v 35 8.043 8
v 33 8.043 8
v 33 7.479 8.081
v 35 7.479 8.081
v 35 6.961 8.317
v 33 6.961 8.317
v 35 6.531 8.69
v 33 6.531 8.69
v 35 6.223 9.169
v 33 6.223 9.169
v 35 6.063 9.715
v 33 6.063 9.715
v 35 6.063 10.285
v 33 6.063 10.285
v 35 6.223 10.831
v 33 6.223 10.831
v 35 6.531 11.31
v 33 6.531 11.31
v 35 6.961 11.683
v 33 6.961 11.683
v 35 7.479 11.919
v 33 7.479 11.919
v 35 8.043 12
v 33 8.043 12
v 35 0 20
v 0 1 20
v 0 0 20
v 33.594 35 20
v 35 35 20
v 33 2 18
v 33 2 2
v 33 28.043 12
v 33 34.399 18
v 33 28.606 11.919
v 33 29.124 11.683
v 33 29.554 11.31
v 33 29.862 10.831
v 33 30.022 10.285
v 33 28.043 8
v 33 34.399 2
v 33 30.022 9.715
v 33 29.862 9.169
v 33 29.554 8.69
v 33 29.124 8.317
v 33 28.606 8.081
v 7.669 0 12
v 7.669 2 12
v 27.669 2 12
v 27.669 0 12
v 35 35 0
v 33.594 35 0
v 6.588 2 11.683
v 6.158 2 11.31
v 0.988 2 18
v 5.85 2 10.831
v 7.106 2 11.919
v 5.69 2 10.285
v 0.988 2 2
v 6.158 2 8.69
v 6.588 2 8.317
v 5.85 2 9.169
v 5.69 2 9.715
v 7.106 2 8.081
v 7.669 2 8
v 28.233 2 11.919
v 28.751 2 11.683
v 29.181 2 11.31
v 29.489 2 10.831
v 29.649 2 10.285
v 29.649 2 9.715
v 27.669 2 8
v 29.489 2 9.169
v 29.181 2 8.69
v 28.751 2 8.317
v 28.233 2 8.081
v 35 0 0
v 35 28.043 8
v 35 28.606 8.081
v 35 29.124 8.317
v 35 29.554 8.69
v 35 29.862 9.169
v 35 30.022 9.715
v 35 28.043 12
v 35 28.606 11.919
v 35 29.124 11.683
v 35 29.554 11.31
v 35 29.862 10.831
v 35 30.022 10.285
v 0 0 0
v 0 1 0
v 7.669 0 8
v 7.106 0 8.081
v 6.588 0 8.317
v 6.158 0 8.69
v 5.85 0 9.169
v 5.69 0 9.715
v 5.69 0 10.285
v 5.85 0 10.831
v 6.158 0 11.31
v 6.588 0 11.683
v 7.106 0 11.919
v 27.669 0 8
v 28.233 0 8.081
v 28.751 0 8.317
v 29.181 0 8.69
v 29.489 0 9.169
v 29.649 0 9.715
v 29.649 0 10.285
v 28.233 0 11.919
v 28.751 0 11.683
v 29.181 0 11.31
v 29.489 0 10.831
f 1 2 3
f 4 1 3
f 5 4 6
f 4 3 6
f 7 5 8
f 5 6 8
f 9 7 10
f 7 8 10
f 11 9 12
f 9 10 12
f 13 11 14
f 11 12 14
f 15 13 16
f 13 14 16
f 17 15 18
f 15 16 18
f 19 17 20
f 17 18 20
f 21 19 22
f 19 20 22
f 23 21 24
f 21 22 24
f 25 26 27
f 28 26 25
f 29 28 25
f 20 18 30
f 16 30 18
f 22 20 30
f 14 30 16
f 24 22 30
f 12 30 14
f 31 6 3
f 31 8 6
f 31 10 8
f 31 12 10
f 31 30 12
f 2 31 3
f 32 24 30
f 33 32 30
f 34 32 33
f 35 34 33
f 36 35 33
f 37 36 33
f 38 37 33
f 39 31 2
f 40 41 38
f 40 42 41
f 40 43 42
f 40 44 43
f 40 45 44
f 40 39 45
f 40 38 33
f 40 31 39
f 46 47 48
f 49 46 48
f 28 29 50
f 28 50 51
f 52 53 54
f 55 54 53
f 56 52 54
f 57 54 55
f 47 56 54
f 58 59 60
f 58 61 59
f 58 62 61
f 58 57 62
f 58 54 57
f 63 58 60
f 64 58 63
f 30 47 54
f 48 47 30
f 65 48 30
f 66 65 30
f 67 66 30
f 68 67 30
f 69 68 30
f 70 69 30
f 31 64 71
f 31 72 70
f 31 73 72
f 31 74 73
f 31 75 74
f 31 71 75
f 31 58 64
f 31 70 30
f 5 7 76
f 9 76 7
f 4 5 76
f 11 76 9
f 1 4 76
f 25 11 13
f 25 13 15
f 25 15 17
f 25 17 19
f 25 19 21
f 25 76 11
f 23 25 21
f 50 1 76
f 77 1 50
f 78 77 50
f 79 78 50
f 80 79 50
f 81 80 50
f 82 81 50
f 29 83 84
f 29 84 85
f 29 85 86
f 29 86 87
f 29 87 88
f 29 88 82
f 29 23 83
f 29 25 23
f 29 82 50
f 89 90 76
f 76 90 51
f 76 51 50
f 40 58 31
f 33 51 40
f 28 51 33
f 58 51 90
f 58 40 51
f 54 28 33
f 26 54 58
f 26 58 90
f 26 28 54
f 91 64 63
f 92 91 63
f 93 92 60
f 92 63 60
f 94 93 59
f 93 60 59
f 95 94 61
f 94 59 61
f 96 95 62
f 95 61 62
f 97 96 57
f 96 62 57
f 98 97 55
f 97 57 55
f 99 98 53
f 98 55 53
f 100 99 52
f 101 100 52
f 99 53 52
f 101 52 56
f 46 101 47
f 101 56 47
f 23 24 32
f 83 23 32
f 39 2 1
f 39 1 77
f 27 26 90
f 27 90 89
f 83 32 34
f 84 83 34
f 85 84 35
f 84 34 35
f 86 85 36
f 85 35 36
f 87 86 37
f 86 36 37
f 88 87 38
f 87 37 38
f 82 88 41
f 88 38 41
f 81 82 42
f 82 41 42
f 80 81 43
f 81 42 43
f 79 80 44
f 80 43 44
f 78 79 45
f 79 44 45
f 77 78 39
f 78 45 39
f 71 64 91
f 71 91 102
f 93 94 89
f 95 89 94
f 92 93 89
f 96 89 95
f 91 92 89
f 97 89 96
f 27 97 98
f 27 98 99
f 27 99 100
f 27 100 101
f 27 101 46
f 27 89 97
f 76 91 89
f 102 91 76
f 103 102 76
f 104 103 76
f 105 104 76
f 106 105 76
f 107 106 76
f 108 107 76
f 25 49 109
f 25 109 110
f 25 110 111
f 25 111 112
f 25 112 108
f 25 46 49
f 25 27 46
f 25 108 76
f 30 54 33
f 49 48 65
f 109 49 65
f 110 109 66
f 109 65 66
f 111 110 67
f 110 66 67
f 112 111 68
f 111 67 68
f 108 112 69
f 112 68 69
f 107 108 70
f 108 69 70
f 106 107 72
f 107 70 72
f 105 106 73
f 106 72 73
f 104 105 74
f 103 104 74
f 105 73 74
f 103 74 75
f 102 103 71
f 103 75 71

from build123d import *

# Parameters (mm, degrees)
EXTRUDE_3_DEPTH     = 10
CUT_EXTRUDE_2_DEPTH = 8
CUT_EXTRUDE_4_DEPTH = 8
CUT_EXTRUDE_5_DEPTH = 8


with BuildPart() as part:
    # 草图1 → 凸台-拉伸3 (new body)
    with BuildSketch(Plane.XY):
        Polygon((0, 0), (35, 0), (35, 35), (33.594225436, 35), (0, 1), align=None)
    extrude(amount=EXTRUDE_3_DEPTH)

    # 草图4 → 切除-拉伸2 (cut)
    with BuildSketch(Plane.XY.offset(10)):
        Polygon((3.799665242, 2), (33, 2), (33, 31.553036836), (33, 35.783784072), (-1.057608141, 2), align=None)
    extrude(amount=-CUT_EXTRUDE_2_DEPTH, mode=Mode.SUBTRACT)

    # 草图7 → 切除-拉伸4 (cut)
    with BuildSketch(Plane(origin=(0, 2, 0), x_dir=(1, 0, 0), z_dir=(0, 1, 0))):
        with BuildLine():
            Line((7.669292291, -8), (27.669292291, -8))
            ThreePointArc((27.669292291, -8), (29.669292291, -10), (27.669292291, -12))
            Line((27.669292291, -12), (7.669292291, -12))
            ThreePointArc((7.669292291, -12), (5.669292291, -10), (7.669292291, -8))
        make_face()
    extrude(amount=-CUT_EXTRUDE_4_DEPTH, mode=Mode.SUBTRACT)

    # 草图8 → 切除-拉伸5 (cut)
    with BuildSketch(Plane.ZY.offset(-33)):
        with BuildLine():
            Line((12, 28.042571575), (12, 8.042571575))
            ThreePointArc((12, 8.042571575), (10, 6.042571575), (8, 8.042571575))
            Line((8, 8.042571575), (8, 28.042571575))
            ThreePointArc((8, 28.042571575), (10, 30.042571575), (12, 28.042571575))
        make_face()
    extrude(amount=-CUT_EXTRUDE_5_DEPTH, mode=Mode.SUBTRACT)

    # 镜向3: part across plane


with BuildPart() as part_1:
    add(part.part)
    add(part.part.mirror(Plane(origin=(0, 35, 10), x_dir=(1, 0, 0), z_dir=(0, 0, 1))))


solid = part_1.part
